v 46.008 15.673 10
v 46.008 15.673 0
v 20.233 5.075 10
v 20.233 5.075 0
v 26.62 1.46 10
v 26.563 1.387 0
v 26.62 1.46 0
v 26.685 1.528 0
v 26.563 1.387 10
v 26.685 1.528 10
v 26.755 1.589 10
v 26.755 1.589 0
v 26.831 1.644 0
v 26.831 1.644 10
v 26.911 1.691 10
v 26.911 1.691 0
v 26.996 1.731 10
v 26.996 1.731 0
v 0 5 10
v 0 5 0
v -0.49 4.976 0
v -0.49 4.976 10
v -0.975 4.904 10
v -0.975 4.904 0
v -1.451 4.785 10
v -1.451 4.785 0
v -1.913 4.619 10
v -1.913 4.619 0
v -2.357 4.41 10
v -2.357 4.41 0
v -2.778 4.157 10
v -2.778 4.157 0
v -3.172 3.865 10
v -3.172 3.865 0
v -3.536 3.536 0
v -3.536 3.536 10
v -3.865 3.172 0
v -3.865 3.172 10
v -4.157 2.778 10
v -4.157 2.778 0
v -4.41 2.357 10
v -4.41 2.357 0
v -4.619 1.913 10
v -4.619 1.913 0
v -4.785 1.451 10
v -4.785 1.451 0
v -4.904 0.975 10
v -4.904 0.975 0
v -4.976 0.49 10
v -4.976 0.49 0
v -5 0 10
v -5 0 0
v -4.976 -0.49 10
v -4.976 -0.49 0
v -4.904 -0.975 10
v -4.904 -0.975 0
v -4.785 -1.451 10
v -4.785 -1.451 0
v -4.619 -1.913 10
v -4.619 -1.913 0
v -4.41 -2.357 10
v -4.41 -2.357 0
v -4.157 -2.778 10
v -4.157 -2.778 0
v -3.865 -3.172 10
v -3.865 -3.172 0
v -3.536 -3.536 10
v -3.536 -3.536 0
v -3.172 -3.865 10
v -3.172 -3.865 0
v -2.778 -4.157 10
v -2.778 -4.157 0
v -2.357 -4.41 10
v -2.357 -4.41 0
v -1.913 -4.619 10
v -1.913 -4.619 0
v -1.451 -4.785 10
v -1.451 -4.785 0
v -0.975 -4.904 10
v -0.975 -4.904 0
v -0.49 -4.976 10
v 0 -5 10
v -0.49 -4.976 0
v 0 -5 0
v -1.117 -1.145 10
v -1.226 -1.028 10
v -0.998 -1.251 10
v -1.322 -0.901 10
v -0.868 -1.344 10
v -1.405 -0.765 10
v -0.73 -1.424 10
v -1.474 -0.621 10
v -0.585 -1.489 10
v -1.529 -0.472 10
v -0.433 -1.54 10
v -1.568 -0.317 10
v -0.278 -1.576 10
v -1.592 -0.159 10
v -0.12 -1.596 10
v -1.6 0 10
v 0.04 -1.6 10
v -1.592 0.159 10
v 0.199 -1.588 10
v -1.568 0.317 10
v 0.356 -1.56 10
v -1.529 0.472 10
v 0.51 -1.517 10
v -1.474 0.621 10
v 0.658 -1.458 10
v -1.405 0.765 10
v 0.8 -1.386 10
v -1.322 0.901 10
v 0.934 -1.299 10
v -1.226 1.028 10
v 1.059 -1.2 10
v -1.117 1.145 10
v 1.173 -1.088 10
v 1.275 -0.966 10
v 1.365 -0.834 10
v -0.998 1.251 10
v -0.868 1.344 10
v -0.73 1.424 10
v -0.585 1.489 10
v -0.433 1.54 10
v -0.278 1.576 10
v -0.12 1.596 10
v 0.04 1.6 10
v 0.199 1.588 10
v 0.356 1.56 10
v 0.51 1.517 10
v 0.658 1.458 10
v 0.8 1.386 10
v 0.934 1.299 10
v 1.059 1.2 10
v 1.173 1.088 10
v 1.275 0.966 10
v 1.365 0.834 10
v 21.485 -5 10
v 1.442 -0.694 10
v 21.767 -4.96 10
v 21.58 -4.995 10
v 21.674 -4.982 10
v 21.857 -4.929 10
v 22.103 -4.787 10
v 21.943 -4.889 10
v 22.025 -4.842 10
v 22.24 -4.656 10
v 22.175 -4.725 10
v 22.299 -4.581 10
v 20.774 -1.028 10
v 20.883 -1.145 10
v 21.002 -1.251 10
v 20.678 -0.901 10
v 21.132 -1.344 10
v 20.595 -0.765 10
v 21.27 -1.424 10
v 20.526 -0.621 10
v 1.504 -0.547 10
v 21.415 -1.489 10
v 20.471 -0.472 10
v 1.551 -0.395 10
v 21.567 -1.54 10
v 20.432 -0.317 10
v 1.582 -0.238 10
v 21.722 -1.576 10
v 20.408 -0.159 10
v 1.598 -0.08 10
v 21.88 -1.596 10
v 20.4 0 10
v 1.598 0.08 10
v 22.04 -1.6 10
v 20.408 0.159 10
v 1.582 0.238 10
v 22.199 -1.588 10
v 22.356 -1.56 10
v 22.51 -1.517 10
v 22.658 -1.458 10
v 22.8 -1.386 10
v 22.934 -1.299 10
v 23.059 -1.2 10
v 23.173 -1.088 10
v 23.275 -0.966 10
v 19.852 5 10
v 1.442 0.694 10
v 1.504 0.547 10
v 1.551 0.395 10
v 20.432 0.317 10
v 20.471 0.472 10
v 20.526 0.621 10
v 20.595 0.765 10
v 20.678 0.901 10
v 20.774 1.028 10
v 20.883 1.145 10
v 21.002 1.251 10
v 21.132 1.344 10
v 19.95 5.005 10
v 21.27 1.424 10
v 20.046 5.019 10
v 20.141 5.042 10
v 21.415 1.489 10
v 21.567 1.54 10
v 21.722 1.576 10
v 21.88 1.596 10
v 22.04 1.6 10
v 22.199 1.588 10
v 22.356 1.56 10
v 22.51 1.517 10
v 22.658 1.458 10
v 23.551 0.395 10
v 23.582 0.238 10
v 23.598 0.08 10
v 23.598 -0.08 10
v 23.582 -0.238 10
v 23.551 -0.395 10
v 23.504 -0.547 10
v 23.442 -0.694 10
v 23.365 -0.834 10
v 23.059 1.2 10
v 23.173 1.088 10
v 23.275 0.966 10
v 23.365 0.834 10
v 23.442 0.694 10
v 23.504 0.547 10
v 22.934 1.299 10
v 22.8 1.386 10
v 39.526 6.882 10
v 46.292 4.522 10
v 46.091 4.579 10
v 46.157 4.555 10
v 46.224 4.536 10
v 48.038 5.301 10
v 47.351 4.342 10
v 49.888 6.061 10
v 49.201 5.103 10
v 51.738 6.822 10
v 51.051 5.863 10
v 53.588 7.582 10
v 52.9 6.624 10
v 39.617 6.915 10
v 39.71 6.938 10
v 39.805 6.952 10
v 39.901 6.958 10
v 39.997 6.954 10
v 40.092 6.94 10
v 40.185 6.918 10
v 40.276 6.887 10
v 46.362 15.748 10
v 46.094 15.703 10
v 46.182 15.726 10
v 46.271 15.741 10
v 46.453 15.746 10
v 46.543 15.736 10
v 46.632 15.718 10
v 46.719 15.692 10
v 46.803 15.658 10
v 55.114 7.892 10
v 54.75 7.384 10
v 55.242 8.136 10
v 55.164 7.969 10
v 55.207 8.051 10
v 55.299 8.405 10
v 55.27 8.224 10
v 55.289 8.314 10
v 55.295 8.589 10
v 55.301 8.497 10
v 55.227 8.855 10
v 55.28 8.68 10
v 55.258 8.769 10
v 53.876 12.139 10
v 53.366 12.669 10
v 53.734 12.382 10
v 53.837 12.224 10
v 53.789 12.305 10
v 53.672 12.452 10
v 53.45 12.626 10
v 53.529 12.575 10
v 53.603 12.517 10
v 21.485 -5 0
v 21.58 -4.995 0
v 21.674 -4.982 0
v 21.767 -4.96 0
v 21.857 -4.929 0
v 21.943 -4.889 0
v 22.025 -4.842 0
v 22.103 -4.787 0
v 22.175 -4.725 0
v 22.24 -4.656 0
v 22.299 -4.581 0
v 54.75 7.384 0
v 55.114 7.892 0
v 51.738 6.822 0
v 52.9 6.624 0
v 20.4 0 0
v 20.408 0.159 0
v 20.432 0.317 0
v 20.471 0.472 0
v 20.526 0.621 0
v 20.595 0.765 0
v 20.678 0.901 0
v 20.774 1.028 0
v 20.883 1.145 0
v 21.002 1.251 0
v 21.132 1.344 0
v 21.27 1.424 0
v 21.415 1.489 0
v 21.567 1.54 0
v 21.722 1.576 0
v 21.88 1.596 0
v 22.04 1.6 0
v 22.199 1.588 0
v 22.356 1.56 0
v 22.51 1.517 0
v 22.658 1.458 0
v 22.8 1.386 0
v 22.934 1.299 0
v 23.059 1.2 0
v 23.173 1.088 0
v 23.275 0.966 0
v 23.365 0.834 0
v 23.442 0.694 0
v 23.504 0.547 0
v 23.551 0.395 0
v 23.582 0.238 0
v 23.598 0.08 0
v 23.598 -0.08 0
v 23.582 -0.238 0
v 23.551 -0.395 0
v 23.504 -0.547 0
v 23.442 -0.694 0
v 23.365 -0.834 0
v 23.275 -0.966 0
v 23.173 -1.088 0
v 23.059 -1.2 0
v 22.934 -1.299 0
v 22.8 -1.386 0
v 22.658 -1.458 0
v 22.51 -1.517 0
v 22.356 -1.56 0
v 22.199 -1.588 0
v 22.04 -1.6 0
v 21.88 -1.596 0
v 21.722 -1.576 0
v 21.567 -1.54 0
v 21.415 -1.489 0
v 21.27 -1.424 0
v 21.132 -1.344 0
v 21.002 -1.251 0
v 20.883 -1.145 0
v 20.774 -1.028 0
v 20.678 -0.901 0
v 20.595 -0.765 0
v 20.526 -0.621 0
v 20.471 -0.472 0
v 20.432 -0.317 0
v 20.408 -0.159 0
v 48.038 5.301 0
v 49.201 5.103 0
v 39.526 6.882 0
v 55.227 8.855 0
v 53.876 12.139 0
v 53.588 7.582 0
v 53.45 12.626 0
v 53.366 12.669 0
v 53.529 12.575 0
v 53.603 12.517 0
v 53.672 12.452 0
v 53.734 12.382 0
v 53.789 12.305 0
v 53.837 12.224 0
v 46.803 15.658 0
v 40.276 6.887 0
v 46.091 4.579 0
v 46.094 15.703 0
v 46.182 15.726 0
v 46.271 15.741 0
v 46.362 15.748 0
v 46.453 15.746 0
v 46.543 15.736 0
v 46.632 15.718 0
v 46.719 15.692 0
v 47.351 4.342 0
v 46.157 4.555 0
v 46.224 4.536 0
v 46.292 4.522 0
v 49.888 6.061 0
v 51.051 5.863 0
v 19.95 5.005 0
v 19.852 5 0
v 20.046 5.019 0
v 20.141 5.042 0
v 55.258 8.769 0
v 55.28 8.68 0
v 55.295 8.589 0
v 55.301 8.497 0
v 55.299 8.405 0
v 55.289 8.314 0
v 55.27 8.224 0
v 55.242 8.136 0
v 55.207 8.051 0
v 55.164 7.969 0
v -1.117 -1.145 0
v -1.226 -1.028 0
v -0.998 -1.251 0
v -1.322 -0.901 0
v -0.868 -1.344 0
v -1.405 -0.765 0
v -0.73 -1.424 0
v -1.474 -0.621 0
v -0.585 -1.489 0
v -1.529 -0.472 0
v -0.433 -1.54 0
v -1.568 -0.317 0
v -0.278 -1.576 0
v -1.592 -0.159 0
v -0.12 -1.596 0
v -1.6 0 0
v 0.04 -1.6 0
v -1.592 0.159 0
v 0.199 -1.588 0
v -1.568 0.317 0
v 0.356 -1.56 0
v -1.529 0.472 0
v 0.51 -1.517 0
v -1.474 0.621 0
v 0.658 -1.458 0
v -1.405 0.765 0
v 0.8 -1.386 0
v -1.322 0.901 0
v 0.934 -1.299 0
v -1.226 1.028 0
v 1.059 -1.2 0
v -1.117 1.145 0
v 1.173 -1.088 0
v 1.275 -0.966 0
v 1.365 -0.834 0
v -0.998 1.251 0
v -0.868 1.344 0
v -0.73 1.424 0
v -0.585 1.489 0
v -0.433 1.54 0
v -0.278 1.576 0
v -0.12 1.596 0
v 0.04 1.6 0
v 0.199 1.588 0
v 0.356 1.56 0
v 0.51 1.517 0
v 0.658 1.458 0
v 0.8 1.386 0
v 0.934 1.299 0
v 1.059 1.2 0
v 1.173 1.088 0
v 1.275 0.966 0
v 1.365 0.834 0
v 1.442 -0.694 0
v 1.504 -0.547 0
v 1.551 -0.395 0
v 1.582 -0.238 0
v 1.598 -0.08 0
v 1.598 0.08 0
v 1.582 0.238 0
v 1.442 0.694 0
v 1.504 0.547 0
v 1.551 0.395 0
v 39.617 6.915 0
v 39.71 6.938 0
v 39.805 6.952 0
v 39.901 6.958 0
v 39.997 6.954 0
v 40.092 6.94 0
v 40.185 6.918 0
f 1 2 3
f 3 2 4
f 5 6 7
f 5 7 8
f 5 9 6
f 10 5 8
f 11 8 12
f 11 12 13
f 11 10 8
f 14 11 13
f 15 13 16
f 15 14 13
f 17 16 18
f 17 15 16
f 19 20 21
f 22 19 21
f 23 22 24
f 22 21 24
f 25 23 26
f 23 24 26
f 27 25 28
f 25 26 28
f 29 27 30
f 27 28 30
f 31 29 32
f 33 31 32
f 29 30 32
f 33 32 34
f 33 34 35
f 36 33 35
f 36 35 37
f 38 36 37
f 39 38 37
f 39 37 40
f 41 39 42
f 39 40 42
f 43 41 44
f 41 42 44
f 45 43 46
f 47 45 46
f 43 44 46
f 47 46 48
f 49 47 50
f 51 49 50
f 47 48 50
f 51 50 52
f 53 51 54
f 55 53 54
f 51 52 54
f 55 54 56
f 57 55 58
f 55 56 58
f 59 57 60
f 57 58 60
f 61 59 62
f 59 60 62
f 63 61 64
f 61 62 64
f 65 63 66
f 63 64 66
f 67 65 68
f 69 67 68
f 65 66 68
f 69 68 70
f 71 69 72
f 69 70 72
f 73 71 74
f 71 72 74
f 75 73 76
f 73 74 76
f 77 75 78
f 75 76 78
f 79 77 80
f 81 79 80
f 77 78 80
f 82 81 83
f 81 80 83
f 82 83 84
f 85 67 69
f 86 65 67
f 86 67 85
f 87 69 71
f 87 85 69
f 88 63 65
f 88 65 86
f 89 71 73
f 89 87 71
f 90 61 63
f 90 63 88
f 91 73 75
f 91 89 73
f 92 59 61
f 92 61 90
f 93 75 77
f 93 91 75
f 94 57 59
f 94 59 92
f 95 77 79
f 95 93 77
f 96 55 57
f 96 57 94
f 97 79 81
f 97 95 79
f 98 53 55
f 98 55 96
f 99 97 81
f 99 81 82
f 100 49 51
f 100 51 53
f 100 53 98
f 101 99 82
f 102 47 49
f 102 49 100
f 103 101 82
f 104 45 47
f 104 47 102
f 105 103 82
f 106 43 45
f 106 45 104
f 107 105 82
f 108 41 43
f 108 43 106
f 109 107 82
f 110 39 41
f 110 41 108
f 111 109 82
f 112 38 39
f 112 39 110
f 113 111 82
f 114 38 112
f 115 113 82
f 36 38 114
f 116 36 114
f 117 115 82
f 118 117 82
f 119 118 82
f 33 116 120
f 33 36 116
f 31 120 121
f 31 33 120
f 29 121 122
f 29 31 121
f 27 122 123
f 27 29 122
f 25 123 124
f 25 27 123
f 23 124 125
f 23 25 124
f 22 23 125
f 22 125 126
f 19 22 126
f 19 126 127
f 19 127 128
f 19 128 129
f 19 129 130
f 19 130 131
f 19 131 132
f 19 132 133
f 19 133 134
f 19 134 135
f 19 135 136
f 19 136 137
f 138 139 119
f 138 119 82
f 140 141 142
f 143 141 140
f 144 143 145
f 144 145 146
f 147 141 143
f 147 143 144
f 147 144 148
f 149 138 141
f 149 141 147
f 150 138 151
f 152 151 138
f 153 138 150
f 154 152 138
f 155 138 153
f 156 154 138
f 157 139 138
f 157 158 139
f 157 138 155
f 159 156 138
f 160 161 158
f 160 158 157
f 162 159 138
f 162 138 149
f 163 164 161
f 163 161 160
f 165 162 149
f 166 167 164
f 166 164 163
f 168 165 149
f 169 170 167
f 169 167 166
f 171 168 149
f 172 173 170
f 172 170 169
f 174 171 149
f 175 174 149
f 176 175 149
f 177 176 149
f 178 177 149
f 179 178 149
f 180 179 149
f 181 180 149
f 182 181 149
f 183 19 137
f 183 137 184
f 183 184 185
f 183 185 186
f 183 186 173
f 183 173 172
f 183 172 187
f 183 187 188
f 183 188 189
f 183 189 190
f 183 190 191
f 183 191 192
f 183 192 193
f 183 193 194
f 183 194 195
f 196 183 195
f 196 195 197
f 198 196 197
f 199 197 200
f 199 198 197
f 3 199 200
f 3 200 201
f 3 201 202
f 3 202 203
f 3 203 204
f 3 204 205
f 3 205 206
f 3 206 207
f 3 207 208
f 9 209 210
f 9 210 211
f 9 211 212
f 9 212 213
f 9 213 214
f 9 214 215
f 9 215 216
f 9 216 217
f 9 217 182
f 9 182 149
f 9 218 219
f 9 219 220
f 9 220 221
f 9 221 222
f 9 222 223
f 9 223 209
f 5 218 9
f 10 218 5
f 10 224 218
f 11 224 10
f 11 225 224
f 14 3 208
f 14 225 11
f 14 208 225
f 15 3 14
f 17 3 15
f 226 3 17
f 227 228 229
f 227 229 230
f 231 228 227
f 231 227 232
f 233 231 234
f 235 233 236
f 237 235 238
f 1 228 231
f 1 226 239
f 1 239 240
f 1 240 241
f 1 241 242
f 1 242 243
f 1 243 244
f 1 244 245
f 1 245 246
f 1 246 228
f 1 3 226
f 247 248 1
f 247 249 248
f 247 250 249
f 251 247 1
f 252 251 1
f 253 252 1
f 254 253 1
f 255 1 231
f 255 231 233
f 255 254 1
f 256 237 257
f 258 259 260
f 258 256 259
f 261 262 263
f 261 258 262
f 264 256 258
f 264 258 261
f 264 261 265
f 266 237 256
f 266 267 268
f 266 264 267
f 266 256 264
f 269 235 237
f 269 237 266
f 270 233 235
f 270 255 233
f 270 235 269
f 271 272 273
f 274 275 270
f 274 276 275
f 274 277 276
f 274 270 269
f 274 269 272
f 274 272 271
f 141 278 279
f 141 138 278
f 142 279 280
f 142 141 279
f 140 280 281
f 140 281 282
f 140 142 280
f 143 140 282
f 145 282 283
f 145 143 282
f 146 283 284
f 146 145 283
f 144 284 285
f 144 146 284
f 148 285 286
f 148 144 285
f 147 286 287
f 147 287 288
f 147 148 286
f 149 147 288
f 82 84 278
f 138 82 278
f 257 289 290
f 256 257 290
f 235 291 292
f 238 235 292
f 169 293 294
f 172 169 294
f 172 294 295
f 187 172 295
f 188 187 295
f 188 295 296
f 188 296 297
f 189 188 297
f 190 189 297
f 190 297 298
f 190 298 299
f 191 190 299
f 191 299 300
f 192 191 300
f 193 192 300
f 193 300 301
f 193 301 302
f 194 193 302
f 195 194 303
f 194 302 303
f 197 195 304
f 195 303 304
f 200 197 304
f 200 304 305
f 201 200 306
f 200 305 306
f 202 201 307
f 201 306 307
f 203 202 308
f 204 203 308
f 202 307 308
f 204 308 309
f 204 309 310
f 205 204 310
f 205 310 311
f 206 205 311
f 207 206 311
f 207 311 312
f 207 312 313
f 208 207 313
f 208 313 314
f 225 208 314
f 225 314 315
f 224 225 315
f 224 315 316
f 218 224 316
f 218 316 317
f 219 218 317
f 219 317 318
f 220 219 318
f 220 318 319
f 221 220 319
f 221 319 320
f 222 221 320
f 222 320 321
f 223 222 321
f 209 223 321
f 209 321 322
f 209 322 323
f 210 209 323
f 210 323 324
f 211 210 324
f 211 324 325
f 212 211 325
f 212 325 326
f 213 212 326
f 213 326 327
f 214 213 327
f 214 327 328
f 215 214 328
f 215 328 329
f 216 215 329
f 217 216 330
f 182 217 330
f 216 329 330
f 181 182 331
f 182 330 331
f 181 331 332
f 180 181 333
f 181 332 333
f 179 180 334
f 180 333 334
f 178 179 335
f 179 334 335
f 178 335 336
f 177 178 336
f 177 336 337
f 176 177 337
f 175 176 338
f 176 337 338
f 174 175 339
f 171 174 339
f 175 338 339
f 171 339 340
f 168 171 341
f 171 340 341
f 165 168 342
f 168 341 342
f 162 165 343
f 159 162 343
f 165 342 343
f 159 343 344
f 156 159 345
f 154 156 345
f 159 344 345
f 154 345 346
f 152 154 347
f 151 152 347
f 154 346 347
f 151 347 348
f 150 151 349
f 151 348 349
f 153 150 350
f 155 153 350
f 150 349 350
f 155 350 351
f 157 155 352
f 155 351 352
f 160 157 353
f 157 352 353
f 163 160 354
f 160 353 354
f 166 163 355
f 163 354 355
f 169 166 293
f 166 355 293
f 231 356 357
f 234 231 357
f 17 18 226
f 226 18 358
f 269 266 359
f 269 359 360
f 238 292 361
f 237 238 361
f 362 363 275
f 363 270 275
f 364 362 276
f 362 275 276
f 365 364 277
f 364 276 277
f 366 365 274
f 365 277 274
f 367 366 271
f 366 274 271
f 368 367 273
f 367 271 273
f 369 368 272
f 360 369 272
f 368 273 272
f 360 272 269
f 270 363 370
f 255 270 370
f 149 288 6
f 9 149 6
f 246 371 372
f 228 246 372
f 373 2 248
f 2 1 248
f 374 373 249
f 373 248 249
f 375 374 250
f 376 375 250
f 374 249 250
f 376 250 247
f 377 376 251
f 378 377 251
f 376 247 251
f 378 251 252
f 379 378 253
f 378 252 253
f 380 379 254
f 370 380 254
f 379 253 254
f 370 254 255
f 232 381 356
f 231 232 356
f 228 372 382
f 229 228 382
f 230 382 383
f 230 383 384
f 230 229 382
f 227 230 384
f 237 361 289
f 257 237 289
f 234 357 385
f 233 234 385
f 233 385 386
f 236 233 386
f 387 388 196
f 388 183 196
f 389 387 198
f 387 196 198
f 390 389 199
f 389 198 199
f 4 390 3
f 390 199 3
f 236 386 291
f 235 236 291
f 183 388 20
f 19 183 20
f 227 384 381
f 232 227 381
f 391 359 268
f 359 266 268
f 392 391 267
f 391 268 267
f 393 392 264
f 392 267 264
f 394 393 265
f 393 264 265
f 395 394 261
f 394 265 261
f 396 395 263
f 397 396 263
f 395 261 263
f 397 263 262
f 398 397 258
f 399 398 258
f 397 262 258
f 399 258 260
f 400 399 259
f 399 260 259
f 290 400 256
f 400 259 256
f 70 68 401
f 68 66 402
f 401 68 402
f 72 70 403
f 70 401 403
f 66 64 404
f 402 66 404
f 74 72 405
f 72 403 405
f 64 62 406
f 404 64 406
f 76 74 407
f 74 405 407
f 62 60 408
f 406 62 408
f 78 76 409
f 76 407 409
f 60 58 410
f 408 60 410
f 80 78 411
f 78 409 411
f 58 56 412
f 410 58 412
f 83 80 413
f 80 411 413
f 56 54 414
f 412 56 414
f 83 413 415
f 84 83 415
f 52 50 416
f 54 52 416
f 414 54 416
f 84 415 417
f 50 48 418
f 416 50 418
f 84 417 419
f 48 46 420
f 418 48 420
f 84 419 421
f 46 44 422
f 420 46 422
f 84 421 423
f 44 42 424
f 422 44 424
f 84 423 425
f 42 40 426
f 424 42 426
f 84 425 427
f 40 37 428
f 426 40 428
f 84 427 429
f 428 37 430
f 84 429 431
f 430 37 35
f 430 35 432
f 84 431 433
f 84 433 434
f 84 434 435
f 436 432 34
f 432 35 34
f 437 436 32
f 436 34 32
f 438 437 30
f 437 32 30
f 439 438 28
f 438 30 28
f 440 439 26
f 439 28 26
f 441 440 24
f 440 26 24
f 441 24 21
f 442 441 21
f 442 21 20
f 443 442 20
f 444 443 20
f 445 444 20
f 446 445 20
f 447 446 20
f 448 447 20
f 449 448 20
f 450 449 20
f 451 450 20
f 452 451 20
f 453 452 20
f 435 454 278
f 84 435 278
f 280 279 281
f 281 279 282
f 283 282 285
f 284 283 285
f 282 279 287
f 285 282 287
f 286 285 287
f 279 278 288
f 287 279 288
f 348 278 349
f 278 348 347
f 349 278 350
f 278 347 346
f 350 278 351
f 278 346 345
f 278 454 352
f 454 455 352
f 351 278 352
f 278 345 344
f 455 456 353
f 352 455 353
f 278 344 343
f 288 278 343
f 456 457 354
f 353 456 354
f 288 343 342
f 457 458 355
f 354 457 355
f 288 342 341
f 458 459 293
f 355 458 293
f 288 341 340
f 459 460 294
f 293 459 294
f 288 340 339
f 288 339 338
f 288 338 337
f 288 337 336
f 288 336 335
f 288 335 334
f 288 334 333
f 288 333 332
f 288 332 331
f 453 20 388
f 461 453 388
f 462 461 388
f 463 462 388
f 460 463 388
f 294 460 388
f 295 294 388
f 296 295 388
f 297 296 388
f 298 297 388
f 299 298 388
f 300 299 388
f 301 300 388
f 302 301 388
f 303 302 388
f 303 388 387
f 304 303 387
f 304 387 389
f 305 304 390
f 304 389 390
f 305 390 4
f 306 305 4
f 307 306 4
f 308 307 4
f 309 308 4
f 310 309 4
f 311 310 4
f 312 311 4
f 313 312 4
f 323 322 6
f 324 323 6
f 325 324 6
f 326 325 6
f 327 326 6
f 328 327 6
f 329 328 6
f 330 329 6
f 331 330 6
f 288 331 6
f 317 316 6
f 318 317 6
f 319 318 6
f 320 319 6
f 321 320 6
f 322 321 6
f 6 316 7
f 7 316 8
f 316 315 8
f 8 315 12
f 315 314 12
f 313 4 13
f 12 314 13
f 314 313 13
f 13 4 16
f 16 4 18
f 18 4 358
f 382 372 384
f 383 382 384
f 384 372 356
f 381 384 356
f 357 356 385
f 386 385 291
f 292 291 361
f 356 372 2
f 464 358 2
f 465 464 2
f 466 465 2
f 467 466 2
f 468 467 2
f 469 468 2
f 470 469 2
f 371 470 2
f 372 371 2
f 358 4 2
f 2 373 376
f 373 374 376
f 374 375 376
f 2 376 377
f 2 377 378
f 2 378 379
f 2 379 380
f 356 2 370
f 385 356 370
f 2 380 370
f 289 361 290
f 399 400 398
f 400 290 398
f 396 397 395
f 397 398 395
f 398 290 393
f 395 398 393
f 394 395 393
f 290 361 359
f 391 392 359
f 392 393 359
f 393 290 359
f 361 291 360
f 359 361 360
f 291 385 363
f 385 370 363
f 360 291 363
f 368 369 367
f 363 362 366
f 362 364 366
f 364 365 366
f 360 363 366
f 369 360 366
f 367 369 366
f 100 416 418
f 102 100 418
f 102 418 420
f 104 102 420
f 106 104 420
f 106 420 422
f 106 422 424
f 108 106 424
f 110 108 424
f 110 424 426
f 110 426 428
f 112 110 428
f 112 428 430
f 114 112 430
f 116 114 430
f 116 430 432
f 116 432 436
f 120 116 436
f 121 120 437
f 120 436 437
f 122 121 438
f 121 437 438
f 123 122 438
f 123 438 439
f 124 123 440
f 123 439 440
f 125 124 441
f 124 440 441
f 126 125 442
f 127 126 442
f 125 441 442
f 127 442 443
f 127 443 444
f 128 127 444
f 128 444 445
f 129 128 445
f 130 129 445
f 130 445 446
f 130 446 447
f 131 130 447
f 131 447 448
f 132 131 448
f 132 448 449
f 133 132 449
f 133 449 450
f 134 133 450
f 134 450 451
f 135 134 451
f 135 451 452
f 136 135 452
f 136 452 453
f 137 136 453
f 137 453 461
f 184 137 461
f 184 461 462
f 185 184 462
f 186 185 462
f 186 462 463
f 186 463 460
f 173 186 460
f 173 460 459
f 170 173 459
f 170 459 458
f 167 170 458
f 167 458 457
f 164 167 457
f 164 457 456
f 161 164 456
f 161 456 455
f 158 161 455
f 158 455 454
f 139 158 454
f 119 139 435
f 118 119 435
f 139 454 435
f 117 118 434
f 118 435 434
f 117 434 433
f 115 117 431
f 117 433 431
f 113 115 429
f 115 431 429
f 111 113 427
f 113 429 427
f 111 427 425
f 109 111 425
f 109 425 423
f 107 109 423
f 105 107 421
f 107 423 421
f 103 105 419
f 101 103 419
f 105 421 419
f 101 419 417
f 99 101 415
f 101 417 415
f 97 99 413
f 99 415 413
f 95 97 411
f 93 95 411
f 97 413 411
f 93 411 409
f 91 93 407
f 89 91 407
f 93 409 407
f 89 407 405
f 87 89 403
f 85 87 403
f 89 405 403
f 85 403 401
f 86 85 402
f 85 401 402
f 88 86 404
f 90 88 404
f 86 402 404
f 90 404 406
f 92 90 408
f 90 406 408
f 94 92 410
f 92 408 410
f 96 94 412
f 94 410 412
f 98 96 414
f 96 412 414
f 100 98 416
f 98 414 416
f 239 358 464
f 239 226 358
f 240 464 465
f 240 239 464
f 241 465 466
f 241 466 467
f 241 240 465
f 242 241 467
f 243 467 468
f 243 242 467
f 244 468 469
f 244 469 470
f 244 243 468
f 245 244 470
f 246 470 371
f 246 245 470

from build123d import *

# Parameters (mm, degrees)
SKETCH1_R            = 1.5
BOSS_EXTRUDE1_DEPTH  = 10
FILLET1_R            = 1
M3_CLEARANCE_HOLE1_D = 3.2


with BuildPart() as part:
    # Sketch1 → Boss-Extrude1 (new body)
    with BuildSketch(Plane.XY):
        with BuildLine():
            Line((20.05, 5), (0, 5))
            ThreePointArc((0, 5), (-5, 0), (0, -5))
            Line((0, -5), (22, -5))
            Line((22, -5), (26.72989842, 1.621129525))
            Line((26.72989842, 1.621129525), (39.900164389, 7.036080522))
            Line((39.900164389, 7.036080522), (46.188488025, 4.540007042))
            Line((46.188488025, 4.540007042), (47.351030887, 4.342221563))
            Line((47.351030887, 4.342221563), (48.038244482, 5.300533868))
            Line((48.038244482, 5.300533868), (49.200787343, 5.102748388))
            Line((49.200787343, 5.102748388), (49.888000938, 6.061060693))
            Line((49.888000938, 6.061060693), (51.050543799, 5.863275214))
            Line((51.050543799, 5.863275214), (51.737757394, 6.821587519))
            Line((51.737757394, 6.821587519), (52.900300256, 6.623802039))
            Line((52.900300256, 6.623802039), (53.587513851, 7.582114344))
            Line((53.587513851, 7.582114344), (54.750056712, 7.384328864))
            Line((54.750056712, 7.384328864), (55.437270307, 8.34264117))
            Line((55.437270307, 8.34264117), (53.72608495, 12.504593197))
            Line((53.72608495, 12.504593197), (46.409029503, 15.837507263))
            Line((46.409029503, 15.837507263), (20.05, 5))
        make_face()
        Circle(SKETCH1_R, mode=Mode.SUBTRACT)
        with Locations((22, 0)):
            Circle(SKETCH1_R, mode=Mode.SUBTRACT)
    extrude(amount=BOSS_EXTRUDE1_DEPTH)

    # Fillet1
    fillet1_edges = [part.edges().sort_by_distance(p)[0] for p in [
        (22, -5, 5),
        (20.05, 5, 5),
        (46.409029503, 15.837507263, 5),
        (53.72608495, 12.504593197, 5),
        (55.437270307, 8.34264117, 5),
        (46.188488025, 4.540007042, 5),
        (39.900164389, 7.036080522, 5),
        (26.72989842, 1.621129525, 5),
    ]]
    fillet(fillet1_edges, radius=FILLET1_R)

    # M3 Clearance Hole1 (through all)
    with Locations(Plane.XY.offset(10)):
        with Locations((0, 0), (22, 0)):
            Hole(M3_CLEARANCE_HOLE1_D / 2)


solid = part.part
